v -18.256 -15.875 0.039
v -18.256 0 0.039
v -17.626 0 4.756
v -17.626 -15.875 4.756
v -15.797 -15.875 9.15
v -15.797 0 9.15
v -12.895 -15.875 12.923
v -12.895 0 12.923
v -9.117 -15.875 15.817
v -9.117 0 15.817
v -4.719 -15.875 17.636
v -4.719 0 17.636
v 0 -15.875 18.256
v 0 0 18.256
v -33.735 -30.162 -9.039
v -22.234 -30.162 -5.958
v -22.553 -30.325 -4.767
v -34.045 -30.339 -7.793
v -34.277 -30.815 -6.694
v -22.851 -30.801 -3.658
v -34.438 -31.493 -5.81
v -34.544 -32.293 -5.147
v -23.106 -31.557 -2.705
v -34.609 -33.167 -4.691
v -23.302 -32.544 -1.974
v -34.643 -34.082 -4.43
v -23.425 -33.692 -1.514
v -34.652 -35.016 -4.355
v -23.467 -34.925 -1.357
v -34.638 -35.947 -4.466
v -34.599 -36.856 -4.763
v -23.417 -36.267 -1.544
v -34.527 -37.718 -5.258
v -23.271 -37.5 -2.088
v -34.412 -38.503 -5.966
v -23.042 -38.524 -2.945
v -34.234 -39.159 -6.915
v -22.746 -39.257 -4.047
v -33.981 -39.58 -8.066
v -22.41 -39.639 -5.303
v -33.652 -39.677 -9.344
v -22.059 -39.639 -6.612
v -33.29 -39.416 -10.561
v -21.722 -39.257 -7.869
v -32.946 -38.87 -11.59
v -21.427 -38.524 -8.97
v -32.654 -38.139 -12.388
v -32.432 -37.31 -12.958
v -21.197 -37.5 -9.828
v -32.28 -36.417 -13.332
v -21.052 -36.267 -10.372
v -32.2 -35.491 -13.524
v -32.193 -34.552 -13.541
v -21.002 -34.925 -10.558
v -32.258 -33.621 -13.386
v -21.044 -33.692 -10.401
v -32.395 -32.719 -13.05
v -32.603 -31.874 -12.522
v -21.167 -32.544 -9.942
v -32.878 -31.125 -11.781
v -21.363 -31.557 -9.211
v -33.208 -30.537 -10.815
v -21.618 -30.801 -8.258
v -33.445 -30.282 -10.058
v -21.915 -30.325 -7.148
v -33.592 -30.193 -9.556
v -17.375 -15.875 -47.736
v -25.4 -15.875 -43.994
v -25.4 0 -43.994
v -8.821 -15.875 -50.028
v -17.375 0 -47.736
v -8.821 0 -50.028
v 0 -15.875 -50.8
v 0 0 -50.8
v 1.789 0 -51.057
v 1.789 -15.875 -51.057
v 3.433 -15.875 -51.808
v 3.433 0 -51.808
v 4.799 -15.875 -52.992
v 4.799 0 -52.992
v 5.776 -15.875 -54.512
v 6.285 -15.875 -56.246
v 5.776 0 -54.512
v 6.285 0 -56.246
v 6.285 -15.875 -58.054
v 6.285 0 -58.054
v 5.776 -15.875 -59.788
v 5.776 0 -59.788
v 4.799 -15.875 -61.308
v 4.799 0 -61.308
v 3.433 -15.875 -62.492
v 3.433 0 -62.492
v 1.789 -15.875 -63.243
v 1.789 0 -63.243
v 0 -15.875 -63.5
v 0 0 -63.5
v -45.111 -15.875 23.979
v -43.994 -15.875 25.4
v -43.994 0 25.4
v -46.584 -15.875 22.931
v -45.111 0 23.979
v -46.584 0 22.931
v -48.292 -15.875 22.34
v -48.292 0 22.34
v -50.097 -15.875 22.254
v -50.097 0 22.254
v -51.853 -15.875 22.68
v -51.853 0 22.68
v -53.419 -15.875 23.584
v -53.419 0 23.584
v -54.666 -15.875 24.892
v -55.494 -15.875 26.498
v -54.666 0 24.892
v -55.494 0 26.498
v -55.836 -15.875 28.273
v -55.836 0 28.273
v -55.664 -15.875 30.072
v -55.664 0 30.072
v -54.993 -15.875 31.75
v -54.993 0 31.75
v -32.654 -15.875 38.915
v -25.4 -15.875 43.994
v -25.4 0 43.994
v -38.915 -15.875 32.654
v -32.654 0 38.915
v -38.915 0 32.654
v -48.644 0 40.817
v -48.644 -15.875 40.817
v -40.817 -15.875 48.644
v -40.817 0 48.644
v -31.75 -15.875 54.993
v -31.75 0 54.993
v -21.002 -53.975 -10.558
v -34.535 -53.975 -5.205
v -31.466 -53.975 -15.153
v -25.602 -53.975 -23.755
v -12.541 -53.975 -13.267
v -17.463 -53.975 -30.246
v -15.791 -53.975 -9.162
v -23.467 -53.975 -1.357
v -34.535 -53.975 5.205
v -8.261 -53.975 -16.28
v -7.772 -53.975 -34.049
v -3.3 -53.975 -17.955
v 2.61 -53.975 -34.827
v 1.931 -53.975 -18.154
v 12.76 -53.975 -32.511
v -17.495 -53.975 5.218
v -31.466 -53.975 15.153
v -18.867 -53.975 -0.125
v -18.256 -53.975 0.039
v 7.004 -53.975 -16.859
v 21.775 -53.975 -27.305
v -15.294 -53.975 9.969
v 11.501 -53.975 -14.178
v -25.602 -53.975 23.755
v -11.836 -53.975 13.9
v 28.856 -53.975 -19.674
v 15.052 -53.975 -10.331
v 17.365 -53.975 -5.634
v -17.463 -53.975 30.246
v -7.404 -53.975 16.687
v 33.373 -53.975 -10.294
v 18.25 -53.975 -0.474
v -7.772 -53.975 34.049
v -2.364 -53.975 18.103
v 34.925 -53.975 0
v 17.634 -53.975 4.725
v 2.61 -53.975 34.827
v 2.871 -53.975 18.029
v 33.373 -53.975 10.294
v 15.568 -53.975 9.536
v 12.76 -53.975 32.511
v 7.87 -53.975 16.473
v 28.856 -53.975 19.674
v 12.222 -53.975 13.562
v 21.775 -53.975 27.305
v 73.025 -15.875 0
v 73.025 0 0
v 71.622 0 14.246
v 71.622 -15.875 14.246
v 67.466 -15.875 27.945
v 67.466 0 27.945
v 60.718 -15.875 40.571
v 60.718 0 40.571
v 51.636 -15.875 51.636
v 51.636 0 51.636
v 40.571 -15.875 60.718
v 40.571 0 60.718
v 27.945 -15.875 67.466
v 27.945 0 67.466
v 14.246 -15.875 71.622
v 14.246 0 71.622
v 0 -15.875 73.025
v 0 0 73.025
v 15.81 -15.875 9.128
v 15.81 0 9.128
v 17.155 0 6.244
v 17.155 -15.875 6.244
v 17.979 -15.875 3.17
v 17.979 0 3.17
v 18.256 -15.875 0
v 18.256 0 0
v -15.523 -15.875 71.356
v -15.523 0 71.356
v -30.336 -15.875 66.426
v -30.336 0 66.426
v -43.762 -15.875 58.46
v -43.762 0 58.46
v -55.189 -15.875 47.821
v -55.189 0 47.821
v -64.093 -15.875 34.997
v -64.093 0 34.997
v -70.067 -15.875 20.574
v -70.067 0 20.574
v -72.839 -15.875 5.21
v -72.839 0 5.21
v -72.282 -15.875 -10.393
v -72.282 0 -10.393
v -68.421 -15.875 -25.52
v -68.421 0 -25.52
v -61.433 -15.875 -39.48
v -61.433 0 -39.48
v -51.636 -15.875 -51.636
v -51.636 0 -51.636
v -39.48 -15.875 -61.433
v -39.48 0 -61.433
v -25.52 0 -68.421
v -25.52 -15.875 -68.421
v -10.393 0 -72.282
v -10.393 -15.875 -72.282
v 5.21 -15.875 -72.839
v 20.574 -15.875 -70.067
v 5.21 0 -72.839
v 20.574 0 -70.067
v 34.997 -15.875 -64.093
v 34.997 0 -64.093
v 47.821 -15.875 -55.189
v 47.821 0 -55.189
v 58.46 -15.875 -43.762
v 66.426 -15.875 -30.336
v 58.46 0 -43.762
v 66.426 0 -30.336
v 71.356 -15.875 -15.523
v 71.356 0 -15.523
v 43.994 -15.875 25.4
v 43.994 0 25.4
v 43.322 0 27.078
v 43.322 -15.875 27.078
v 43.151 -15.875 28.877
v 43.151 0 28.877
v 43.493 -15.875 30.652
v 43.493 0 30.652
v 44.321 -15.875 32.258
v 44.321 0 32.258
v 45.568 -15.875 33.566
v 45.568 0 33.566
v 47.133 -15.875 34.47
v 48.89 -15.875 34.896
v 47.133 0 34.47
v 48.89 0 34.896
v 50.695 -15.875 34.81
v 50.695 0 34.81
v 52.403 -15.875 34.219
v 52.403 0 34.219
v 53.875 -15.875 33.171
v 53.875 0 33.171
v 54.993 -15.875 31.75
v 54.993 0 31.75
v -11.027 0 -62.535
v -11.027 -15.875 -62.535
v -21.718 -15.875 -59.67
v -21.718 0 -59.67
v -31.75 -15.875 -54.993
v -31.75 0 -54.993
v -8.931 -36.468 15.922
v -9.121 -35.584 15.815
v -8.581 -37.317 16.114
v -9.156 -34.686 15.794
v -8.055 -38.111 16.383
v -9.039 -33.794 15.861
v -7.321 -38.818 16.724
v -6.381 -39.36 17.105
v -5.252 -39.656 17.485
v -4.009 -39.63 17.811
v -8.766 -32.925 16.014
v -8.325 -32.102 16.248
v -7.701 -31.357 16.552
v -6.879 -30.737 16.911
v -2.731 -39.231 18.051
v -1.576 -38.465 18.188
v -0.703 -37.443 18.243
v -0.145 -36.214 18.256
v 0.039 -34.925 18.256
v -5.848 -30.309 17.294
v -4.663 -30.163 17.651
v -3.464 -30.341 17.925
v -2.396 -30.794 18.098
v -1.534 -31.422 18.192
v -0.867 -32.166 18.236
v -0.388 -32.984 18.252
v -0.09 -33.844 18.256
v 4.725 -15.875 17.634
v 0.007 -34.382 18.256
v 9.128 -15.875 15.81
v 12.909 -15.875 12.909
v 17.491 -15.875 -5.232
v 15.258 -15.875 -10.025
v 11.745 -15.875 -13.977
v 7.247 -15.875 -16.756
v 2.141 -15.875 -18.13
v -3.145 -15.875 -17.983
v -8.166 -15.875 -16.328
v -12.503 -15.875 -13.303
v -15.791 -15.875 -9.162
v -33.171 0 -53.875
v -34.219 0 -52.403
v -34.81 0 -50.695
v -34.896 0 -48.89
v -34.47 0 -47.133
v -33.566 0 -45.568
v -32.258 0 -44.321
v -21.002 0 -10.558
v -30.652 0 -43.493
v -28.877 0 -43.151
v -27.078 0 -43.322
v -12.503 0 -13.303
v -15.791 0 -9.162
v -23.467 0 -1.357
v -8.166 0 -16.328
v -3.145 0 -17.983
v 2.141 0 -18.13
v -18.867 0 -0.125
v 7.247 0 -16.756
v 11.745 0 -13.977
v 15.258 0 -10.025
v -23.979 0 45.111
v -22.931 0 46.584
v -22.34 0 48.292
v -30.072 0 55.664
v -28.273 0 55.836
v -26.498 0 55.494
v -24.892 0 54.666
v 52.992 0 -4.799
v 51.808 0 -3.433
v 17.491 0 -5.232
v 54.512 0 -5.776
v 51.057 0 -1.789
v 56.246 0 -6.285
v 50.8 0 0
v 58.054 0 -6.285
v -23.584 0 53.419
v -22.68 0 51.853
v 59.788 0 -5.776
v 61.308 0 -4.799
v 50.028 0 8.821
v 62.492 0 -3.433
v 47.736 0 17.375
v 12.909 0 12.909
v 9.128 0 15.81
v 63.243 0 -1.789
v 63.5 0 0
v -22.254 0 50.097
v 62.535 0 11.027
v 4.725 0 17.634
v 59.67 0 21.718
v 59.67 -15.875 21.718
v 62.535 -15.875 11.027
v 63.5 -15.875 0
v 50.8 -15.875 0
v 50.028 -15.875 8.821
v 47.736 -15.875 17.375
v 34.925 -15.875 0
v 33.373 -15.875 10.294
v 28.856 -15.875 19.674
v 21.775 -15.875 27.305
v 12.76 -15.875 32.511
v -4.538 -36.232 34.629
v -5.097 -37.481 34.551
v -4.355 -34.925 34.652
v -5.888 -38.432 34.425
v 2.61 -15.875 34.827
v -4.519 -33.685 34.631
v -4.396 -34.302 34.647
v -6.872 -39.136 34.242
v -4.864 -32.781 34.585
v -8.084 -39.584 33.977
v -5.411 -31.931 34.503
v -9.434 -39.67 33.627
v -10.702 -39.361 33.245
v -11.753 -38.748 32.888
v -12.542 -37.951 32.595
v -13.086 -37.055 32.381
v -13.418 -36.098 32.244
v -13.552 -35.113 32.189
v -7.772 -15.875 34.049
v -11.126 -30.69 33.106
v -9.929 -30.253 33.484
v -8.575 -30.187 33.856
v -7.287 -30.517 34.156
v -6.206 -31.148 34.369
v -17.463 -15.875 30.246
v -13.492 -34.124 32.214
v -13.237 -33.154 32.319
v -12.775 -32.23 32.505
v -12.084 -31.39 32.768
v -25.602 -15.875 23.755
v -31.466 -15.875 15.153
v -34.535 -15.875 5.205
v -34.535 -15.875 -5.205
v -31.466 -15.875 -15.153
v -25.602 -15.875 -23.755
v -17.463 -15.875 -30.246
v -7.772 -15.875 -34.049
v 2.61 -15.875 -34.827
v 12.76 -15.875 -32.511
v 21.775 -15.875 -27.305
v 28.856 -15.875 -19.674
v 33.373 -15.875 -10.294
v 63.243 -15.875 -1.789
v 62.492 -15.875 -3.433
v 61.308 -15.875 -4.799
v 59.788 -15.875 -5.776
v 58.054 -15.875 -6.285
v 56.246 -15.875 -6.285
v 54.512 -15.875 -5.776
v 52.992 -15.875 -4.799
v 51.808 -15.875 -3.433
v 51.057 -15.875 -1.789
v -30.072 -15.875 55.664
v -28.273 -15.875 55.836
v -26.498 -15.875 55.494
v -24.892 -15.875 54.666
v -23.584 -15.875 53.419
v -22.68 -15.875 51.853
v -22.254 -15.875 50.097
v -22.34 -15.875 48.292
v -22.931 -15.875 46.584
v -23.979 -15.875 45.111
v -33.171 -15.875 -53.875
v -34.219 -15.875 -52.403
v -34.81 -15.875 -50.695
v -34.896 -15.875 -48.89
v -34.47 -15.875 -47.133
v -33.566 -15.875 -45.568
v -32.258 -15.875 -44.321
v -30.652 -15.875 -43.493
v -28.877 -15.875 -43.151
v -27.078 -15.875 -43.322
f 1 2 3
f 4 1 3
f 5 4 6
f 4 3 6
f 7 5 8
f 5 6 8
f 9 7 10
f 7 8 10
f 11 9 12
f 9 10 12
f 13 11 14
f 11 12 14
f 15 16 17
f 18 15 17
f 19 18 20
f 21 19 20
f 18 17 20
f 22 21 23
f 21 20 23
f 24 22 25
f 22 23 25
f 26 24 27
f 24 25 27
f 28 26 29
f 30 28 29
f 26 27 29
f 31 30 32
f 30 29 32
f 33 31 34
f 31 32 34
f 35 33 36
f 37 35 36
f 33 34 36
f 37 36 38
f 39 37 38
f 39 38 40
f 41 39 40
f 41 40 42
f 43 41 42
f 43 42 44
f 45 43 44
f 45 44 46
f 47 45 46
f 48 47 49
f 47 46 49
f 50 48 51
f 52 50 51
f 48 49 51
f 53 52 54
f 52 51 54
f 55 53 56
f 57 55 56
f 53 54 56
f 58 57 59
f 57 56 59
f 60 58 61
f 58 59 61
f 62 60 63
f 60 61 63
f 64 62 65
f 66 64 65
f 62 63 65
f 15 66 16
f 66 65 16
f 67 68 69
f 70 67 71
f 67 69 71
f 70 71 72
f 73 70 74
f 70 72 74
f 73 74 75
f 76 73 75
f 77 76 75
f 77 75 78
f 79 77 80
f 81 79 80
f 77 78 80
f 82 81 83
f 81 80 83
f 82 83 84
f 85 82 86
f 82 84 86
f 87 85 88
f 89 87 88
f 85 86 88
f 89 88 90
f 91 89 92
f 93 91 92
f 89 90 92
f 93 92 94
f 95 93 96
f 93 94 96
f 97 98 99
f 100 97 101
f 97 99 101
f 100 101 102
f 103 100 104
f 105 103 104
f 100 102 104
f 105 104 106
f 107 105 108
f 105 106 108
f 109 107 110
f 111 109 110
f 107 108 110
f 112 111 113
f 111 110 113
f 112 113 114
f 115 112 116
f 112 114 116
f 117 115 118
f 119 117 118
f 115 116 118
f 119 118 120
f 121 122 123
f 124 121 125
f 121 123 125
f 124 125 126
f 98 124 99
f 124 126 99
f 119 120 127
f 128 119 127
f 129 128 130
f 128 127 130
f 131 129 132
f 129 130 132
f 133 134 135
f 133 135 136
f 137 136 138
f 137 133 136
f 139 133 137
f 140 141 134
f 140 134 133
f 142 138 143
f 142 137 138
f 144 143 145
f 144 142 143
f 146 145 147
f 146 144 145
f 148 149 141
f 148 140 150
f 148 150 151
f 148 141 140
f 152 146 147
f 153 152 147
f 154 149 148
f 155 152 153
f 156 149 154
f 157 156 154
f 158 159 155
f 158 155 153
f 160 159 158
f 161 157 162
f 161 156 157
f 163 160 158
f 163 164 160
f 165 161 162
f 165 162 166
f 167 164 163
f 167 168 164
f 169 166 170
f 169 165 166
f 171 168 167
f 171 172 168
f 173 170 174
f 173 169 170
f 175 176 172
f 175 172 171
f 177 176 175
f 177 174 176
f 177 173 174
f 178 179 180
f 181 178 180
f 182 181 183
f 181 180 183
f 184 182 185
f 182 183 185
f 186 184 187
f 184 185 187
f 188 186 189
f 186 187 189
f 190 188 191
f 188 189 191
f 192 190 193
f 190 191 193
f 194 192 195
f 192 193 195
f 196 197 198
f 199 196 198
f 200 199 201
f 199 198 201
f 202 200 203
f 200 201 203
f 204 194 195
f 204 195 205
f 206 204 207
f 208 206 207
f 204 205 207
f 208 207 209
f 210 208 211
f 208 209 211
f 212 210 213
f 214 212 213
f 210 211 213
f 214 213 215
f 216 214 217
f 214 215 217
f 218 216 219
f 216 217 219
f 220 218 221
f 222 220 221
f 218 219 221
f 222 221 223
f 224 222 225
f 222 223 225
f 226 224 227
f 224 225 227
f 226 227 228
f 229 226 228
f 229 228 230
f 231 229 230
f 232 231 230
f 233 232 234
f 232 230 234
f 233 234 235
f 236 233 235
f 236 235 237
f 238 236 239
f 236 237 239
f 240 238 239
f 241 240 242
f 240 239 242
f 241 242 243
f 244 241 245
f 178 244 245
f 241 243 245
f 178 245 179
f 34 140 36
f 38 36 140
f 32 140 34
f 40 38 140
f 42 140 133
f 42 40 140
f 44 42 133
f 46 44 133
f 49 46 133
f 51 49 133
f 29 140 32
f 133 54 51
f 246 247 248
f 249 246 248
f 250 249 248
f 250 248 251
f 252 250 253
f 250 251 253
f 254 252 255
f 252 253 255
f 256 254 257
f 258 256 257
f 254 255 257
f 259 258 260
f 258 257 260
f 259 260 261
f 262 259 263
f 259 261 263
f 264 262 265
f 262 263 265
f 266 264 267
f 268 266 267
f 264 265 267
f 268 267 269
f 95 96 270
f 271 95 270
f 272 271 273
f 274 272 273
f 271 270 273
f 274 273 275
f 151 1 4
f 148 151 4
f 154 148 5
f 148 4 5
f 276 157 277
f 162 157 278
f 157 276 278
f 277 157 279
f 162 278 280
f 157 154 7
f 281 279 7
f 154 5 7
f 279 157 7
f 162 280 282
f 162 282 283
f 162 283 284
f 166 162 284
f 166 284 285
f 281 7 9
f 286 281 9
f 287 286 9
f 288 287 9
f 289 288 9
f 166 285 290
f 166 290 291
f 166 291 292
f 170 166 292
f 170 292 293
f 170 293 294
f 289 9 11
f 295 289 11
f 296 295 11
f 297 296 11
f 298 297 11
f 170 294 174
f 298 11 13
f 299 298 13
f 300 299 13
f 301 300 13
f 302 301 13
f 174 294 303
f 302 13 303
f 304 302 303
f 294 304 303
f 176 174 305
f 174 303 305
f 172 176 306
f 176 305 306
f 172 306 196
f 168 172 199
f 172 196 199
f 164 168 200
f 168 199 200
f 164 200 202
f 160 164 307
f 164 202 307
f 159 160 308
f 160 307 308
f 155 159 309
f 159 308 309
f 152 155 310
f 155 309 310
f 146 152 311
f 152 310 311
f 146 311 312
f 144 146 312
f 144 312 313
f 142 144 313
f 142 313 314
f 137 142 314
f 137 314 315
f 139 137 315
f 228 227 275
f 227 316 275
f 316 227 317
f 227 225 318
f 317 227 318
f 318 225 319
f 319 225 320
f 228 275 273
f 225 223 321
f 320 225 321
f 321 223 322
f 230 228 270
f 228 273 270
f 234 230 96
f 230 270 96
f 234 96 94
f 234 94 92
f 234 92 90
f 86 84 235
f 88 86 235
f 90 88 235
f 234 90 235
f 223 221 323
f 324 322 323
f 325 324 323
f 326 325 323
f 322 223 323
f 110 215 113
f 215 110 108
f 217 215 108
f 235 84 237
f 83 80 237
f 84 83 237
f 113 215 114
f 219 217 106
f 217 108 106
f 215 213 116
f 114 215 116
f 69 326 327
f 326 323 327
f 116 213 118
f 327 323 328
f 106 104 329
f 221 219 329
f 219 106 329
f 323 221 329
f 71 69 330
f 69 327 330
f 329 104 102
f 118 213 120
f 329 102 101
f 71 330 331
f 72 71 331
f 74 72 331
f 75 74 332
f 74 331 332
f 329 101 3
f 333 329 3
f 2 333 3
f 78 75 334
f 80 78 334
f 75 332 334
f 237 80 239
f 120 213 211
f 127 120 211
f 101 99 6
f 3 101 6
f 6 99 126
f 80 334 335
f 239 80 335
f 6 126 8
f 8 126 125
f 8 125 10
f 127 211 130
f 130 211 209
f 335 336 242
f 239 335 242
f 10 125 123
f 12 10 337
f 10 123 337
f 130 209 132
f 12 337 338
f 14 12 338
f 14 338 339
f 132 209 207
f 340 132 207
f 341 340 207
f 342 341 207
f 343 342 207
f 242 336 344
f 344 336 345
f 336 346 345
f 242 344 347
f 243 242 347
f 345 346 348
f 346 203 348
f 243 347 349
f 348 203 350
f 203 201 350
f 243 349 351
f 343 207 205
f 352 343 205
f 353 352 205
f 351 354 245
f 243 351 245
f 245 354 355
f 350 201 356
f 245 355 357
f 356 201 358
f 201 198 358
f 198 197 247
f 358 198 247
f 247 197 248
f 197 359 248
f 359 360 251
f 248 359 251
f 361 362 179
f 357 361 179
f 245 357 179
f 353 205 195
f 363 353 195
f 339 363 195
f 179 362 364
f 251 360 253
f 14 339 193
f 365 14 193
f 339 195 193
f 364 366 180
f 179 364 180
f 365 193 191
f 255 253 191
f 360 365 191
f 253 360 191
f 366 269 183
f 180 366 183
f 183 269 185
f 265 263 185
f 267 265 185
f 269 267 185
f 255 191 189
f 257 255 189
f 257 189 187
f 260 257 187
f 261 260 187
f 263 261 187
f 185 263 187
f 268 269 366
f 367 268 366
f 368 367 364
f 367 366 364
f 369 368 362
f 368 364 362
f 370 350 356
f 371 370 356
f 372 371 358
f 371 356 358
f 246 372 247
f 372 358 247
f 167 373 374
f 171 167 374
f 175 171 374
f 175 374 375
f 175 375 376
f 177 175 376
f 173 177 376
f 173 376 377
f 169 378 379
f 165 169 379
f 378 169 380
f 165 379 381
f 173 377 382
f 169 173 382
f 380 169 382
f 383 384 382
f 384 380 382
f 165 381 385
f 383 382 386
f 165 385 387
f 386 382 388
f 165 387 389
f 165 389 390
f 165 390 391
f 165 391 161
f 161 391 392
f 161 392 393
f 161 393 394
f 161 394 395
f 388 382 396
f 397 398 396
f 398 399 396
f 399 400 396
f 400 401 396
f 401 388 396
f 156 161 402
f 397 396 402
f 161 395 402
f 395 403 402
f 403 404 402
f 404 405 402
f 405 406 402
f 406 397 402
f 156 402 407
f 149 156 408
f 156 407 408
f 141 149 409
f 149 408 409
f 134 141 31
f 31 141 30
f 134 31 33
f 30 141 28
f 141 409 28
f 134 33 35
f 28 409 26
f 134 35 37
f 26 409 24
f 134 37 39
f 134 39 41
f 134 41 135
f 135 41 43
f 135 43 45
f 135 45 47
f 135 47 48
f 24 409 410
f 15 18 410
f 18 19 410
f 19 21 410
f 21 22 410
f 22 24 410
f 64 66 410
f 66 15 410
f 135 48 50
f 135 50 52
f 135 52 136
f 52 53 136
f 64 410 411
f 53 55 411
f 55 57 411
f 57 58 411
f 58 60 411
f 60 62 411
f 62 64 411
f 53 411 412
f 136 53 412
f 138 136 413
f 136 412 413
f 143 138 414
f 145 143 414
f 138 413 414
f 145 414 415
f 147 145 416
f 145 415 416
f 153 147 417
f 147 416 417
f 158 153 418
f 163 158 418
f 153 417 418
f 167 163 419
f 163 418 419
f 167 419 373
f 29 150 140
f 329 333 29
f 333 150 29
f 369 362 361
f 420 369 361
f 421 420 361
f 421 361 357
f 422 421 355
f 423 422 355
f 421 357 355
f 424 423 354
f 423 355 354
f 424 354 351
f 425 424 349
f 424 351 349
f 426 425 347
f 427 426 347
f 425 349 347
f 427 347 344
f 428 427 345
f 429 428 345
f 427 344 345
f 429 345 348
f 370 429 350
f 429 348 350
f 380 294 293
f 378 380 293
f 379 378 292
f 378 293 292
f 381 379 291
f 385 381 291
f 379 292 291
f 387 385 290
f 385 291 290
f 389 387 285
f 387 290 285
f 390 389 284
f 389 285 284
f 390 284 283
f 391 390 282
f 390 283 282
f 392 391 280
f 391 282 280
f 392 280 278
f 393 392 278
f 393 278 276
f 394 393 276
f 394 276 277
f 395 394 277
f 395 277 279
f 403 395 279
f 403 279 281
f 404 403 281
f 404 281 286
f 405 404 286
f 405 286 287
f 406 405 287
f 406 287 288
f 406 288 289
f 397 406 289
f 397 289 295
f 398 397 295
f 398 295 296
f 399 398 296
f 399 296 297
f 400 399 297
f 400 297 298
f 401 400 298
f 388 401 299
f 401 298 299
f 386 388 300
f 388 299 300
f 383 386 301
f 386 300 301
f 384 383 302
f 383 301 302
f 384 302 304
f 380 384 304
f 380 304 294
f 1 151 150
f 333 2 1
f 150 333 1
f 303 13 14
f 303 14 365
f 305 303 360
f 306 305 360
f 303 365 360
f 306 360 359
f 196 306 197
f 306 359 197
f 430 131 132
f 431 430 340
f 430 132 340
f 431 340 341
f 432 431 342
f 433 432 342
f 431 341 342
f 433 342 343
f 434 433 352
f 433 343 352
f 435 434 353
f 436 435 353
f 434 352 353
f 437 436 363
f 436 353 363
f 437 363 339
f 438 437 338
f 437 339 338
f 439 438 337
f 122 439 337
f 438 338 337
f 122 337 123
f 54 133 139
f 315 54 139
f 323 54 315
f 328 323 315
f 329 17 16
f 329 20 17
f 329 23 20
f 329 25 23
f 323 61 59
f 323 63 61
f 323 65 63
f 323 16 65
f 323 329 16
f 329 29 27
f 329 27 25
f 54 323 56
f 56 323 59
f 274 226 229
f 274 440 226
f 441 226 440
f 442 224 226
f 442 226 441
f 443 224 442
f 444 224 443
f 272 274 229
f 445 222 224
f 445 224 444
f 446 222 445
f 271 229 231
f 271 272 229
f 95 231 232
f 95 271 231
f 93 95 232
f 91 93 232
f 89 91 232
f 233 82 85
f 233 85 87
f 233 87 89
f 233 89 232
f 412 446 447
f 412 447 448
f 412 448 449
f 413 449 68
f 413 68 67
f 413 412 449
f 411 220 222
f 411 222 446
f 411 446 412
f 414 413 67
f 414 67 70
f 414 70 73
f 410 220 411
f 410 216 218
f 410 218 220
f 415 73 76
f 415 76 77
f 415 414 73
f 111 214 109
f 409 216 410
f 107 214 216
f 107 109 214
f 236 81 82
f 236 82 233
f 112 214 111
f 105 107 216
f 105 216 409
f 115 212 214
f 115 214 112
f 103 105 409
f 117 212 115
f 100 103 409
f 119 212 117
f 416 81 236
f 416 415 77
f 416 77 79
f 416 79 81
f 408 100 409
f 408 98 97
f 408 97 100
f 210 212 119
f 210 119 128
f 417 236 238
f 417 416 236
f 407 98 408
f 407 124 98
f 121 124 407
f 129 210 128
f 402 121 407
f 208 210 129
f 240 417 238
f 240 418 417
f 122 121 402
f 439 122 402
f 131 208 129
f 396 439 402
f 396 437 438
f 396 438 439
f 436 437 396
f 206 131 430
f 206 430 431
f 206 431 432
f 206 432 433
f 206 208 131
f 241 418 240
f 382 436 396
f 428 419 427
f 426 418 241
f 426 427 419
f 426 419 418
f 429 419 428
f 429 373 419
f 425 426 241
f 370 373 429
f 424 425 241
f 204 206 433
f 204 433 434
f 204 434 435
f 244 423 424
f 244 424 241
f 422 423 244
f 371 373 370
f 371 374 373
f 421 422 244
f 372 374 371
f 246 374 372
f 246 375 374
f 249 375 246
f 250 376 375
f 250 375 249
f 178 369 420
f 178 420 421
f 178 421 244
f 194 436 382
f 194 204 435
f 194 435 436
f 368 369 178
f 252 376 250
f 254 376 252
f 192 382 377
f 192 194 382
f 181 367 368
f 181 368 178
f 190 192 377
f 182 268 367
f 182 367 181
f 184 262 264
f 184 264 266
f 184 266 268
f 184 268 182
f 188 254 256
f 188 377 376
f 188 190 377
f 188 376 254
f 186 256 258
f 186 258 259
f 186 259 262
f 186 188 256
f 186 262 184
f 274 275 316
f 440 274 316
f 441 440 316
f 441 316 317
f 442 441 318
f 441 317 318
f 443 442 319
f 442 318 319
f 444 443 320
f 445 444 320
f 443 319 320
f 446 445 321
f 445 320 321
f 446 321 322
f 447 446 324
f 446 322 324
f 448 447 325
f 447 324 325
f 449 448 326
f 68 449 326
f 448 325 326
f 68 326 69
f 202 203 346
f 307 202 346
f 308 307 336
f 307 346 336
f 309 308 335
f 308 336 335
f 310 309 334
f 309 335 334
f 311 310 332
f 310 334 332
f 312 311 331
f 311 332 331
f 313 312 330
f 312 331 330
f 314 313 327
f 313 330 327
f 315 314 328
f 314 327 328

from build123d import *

# Parameters (mm, degrees)
F1_DEPTH    = 15.875
F2_R        = 34.925
F3_DEPTH    = 38.1
F3_FACE_R   = 34.925
F3_FACE_R_2 = 18.25625
F5_DEPTH    = 76.2
F6_R        = 4.7625
F7_DEPTH    = 25.4
F8_R        = 4.7625
F9_DEPTH    = 50.8


with BuildPart() as f1:
    # F0 (on Front) → F1 (new body)
    with BuildSketch(Plane.XZ):
        with BuildLine():
            ThreePointArc((0, 73.025), (-51.6364726961, -51.6364726961), (73.025, 0))
            ThreePointArc((73.025, 0), (51.6364726961, 51.6364726961), (0, 73.025))
        make_face()
        with BuildLine():
            ThreePointArc((-31.75, -54.9926131403), (-34.074261314, -46.3183518263), (-25.4, -43.9940905122))
            ThreePointArc((-25.4, -43.9940905122), (-13.1480074912, -49.0690319755), (0, -50.8))
            ThreePointArc((0, -50.8), (6.35, -57.15), (0, -63.5))
            ThreePointArc((0, -63.5), (-16.435009364, -61.3362899694), (-31.75, -54.9926131403))
        make_face(mode=Mode.SUBTRACT)
        with BuildLine():
            ThreePointArc((-31.75, 54.9926131403), (-23.075738686, 52.6683518263), (-25.4, 43.9940905122))
            ThreePointArc((-25.4, 43.9940905122), (-35.9210244843, 35.9210244843), (-43.9940905122, 25.4))
            ThreePointArc((-43.9940905122, 25.4), (-52.6683518263, 23.075738686), (-54.9926131403, 31.75))
            ThreePointArc((-54.9926131403, 31.75), (-44.9012806053, 44.9012806053), (-31.75, 54.9926131403))
        make_face(mode=Mode.SUBTRACT)
        with BuildLine():
            ThreePointArc((18.25625, 0), (-12.909118174, -12.909118174), (0, 18.25625))
            ThreePointArc((0, 18.25625), (9.128125, 15.8103762778), (15.8103762778, 9.128125))
            ThreePointArc((15.8103762778, 9.128125), (17.6341833662, 4.7250651922), (18.25625, 0))
        make_face(mode=Mode.SUBTRACT)
        with BuildLine():
            ThreePointArc((50.8, 0), (49.0690319755, 13.1480074912), (43.9940905122, 25.4))
            ThreePointArc((43.9940905122, 25.4), (46.3183518263, 34.074261314), (54.9926131403, 31.75))
            ThreePointArc((54.9926131403, 31.75), (61.3362899694, 16.435009364), (63.5, 0))
            ThreePointArc((63.5, 0), (57.15, -6.35), (50.8, 0))
        make_face(mode=Mode.SUBTRACT)
    extrude(amount=F1_DEPTH)

    # F2 (on face) → F3 (join)
    with BuildSketch(Plane.XZ.offset(15.875)):
        Circle(F2_R)
        with BuildLine():
            ThreePointArc((-18.25625, 0), (0, 18.25625), (18.25625, 0))
            ThreePointArc((18.25625, 0), (0, -18.25625), (-18.25625, 0))
        make_face(mode=Mode.SUBTRACT)
    extrude(amount=F3_DEPTH)

    # F4 (on Front) + F3_face (on face) → F5 (cut)
    with BuildSketch(Plane.XZ):
        with BuildLine():
            ThreePointArc((-15.7909574359, -9.1616771019), (4.7437852698, -17.6291566836), (18.25625, 0))
            ThreePointArc((18.25625, 0), (18.1000652505, 2.3829187967), (17.6341833662, 4.7250651922))
            Line((17.6341833662, 4.7250651922), (-13.0339616185, -3.4924394899))
            Line((-13.0339616185, -3.4924394899), (-11.8013359162, -8.0926612376))
            Line((-11.8013359162, -8.0926612376), (-15.7909574359, -9.1616771019))
        make_face()
        with BuildLine():
            Line((-13.0339616185, -3.4924394899), (17.6341833662, 4.7250651922))
            ThreePointArc((17.6341833662, 4.7250651922), (-2.363700072, 18.1025850649), (-18.2562088405, 0.0387663935))
            Line((-18.2562088405, 0.0387663935), (-14.2665873208, 1.1077822578))
            Line((-14.2665873208, 1.1077822578), (-13.0339616185, -3.4924394899))
        make_face()
        with BuildLine():
            Line((-21.0017794116, -10.5579126422), (-15.7909574359, -9.1616771019))
            ThreePointArc((-15.7909574359, -9.1616771019), (-16.8591485764, -7.0042682232), (-17.6341833662, -4.7250651922))
            Line((-17.6341833662, -4.7250651922), (-22.2344051139, -5.9576908945))
            Line((-22.2344051139, -5.9576908945), (-21.0017794116, -10.5579126422))
        make_face()
        with BuildLine():
            ThreePointArc((-17.6341833662, -4.7250651922), (-16.8591485764, -7.0042682232), (-15.7909574359, -9.1616771019))
            Line((-15.7909574359, -9.1616771019), (-11.8013359162, -8.0926612376))
            Line((-11.8013359162, -8.0926612376), (-13.0339616185, -3.4924394899))
            Line((-13.0339616185, -3.4924394899), (-17.6341833662, -4.7250651922))
        make_face()
        with BuildLine():
            Line((-14.2665873208, 1.1077822578), (-18.2562088405, 0.0387663935))
            ThreePointArc((-18.2562088405, 0.0387663935), (-18.1025850649, -2.363700072), (-17.6341833662, -4.7250651922))
            Line((-17.6341833662, -4.7250651922), (-13.0339616185, -3.4924394899))
            Line((-13.0339616185, -3.4924394899), (-14.2665873208, 1.1077822578))
        make_face()
        with BuildLine():
            ThreePointArc((-17.6341833662, -4.7250651922), (-18.1025850649, -2.363700072), (-18.2562088405, 0.0387663935))
            Line((-18.2562088405, 0.0387663935), (-18.8668090685, -0.1248434445))
            Line((-18.8668090685, -0.1248434445), (-17.6341833662, -4.7250651922))
        make_face()
        Polygon((-22.2344051139, -5.9576908945), (-17.6341833662, -4.7250651922), (-18.8668090685, -0.1248434445), (-23.4670308162, -1.3574691468), align=None)
    with BuildSketch(Plane.XZ.offset(53.975)):
        Circle(F3_FACE_R)
        Circle(F3_FACE_R_2, mode=Mode.SUBTRACT)
    extrude(amount=F5_DEPTH, mode=Mode.SUBTRACT)

    # F6 (on face) → F7 (cut)
    with BuildSketch(Plane(origin=(-22.2344051139, 0, -5.9576908945), x_dir=(0, 1, 0), z_dir=(0.9659258263, 0, 0.2588190451))):
        with Locations((-34.925, 0)):
            Circle(F6_R)
    extrude(amount=-F7_DEPTH, mode=Mode.SUBTRACT)

    # F8 (on face) → F9 (cut)
    with BuildSketch(Plane(origin=(-1.2326257023, 0, 4.6002217477), x_dir=(0.9659258263, 0, 0.2588190451), z_dir=(0.2588190451, 0, -0.9659258263))):
        with Locations((0, 34.925)):
            Circle(F8_R)
    extrude(amount=-F9_DEPTH, mode=Mode.SUBTRACT)


solid = f1.part
